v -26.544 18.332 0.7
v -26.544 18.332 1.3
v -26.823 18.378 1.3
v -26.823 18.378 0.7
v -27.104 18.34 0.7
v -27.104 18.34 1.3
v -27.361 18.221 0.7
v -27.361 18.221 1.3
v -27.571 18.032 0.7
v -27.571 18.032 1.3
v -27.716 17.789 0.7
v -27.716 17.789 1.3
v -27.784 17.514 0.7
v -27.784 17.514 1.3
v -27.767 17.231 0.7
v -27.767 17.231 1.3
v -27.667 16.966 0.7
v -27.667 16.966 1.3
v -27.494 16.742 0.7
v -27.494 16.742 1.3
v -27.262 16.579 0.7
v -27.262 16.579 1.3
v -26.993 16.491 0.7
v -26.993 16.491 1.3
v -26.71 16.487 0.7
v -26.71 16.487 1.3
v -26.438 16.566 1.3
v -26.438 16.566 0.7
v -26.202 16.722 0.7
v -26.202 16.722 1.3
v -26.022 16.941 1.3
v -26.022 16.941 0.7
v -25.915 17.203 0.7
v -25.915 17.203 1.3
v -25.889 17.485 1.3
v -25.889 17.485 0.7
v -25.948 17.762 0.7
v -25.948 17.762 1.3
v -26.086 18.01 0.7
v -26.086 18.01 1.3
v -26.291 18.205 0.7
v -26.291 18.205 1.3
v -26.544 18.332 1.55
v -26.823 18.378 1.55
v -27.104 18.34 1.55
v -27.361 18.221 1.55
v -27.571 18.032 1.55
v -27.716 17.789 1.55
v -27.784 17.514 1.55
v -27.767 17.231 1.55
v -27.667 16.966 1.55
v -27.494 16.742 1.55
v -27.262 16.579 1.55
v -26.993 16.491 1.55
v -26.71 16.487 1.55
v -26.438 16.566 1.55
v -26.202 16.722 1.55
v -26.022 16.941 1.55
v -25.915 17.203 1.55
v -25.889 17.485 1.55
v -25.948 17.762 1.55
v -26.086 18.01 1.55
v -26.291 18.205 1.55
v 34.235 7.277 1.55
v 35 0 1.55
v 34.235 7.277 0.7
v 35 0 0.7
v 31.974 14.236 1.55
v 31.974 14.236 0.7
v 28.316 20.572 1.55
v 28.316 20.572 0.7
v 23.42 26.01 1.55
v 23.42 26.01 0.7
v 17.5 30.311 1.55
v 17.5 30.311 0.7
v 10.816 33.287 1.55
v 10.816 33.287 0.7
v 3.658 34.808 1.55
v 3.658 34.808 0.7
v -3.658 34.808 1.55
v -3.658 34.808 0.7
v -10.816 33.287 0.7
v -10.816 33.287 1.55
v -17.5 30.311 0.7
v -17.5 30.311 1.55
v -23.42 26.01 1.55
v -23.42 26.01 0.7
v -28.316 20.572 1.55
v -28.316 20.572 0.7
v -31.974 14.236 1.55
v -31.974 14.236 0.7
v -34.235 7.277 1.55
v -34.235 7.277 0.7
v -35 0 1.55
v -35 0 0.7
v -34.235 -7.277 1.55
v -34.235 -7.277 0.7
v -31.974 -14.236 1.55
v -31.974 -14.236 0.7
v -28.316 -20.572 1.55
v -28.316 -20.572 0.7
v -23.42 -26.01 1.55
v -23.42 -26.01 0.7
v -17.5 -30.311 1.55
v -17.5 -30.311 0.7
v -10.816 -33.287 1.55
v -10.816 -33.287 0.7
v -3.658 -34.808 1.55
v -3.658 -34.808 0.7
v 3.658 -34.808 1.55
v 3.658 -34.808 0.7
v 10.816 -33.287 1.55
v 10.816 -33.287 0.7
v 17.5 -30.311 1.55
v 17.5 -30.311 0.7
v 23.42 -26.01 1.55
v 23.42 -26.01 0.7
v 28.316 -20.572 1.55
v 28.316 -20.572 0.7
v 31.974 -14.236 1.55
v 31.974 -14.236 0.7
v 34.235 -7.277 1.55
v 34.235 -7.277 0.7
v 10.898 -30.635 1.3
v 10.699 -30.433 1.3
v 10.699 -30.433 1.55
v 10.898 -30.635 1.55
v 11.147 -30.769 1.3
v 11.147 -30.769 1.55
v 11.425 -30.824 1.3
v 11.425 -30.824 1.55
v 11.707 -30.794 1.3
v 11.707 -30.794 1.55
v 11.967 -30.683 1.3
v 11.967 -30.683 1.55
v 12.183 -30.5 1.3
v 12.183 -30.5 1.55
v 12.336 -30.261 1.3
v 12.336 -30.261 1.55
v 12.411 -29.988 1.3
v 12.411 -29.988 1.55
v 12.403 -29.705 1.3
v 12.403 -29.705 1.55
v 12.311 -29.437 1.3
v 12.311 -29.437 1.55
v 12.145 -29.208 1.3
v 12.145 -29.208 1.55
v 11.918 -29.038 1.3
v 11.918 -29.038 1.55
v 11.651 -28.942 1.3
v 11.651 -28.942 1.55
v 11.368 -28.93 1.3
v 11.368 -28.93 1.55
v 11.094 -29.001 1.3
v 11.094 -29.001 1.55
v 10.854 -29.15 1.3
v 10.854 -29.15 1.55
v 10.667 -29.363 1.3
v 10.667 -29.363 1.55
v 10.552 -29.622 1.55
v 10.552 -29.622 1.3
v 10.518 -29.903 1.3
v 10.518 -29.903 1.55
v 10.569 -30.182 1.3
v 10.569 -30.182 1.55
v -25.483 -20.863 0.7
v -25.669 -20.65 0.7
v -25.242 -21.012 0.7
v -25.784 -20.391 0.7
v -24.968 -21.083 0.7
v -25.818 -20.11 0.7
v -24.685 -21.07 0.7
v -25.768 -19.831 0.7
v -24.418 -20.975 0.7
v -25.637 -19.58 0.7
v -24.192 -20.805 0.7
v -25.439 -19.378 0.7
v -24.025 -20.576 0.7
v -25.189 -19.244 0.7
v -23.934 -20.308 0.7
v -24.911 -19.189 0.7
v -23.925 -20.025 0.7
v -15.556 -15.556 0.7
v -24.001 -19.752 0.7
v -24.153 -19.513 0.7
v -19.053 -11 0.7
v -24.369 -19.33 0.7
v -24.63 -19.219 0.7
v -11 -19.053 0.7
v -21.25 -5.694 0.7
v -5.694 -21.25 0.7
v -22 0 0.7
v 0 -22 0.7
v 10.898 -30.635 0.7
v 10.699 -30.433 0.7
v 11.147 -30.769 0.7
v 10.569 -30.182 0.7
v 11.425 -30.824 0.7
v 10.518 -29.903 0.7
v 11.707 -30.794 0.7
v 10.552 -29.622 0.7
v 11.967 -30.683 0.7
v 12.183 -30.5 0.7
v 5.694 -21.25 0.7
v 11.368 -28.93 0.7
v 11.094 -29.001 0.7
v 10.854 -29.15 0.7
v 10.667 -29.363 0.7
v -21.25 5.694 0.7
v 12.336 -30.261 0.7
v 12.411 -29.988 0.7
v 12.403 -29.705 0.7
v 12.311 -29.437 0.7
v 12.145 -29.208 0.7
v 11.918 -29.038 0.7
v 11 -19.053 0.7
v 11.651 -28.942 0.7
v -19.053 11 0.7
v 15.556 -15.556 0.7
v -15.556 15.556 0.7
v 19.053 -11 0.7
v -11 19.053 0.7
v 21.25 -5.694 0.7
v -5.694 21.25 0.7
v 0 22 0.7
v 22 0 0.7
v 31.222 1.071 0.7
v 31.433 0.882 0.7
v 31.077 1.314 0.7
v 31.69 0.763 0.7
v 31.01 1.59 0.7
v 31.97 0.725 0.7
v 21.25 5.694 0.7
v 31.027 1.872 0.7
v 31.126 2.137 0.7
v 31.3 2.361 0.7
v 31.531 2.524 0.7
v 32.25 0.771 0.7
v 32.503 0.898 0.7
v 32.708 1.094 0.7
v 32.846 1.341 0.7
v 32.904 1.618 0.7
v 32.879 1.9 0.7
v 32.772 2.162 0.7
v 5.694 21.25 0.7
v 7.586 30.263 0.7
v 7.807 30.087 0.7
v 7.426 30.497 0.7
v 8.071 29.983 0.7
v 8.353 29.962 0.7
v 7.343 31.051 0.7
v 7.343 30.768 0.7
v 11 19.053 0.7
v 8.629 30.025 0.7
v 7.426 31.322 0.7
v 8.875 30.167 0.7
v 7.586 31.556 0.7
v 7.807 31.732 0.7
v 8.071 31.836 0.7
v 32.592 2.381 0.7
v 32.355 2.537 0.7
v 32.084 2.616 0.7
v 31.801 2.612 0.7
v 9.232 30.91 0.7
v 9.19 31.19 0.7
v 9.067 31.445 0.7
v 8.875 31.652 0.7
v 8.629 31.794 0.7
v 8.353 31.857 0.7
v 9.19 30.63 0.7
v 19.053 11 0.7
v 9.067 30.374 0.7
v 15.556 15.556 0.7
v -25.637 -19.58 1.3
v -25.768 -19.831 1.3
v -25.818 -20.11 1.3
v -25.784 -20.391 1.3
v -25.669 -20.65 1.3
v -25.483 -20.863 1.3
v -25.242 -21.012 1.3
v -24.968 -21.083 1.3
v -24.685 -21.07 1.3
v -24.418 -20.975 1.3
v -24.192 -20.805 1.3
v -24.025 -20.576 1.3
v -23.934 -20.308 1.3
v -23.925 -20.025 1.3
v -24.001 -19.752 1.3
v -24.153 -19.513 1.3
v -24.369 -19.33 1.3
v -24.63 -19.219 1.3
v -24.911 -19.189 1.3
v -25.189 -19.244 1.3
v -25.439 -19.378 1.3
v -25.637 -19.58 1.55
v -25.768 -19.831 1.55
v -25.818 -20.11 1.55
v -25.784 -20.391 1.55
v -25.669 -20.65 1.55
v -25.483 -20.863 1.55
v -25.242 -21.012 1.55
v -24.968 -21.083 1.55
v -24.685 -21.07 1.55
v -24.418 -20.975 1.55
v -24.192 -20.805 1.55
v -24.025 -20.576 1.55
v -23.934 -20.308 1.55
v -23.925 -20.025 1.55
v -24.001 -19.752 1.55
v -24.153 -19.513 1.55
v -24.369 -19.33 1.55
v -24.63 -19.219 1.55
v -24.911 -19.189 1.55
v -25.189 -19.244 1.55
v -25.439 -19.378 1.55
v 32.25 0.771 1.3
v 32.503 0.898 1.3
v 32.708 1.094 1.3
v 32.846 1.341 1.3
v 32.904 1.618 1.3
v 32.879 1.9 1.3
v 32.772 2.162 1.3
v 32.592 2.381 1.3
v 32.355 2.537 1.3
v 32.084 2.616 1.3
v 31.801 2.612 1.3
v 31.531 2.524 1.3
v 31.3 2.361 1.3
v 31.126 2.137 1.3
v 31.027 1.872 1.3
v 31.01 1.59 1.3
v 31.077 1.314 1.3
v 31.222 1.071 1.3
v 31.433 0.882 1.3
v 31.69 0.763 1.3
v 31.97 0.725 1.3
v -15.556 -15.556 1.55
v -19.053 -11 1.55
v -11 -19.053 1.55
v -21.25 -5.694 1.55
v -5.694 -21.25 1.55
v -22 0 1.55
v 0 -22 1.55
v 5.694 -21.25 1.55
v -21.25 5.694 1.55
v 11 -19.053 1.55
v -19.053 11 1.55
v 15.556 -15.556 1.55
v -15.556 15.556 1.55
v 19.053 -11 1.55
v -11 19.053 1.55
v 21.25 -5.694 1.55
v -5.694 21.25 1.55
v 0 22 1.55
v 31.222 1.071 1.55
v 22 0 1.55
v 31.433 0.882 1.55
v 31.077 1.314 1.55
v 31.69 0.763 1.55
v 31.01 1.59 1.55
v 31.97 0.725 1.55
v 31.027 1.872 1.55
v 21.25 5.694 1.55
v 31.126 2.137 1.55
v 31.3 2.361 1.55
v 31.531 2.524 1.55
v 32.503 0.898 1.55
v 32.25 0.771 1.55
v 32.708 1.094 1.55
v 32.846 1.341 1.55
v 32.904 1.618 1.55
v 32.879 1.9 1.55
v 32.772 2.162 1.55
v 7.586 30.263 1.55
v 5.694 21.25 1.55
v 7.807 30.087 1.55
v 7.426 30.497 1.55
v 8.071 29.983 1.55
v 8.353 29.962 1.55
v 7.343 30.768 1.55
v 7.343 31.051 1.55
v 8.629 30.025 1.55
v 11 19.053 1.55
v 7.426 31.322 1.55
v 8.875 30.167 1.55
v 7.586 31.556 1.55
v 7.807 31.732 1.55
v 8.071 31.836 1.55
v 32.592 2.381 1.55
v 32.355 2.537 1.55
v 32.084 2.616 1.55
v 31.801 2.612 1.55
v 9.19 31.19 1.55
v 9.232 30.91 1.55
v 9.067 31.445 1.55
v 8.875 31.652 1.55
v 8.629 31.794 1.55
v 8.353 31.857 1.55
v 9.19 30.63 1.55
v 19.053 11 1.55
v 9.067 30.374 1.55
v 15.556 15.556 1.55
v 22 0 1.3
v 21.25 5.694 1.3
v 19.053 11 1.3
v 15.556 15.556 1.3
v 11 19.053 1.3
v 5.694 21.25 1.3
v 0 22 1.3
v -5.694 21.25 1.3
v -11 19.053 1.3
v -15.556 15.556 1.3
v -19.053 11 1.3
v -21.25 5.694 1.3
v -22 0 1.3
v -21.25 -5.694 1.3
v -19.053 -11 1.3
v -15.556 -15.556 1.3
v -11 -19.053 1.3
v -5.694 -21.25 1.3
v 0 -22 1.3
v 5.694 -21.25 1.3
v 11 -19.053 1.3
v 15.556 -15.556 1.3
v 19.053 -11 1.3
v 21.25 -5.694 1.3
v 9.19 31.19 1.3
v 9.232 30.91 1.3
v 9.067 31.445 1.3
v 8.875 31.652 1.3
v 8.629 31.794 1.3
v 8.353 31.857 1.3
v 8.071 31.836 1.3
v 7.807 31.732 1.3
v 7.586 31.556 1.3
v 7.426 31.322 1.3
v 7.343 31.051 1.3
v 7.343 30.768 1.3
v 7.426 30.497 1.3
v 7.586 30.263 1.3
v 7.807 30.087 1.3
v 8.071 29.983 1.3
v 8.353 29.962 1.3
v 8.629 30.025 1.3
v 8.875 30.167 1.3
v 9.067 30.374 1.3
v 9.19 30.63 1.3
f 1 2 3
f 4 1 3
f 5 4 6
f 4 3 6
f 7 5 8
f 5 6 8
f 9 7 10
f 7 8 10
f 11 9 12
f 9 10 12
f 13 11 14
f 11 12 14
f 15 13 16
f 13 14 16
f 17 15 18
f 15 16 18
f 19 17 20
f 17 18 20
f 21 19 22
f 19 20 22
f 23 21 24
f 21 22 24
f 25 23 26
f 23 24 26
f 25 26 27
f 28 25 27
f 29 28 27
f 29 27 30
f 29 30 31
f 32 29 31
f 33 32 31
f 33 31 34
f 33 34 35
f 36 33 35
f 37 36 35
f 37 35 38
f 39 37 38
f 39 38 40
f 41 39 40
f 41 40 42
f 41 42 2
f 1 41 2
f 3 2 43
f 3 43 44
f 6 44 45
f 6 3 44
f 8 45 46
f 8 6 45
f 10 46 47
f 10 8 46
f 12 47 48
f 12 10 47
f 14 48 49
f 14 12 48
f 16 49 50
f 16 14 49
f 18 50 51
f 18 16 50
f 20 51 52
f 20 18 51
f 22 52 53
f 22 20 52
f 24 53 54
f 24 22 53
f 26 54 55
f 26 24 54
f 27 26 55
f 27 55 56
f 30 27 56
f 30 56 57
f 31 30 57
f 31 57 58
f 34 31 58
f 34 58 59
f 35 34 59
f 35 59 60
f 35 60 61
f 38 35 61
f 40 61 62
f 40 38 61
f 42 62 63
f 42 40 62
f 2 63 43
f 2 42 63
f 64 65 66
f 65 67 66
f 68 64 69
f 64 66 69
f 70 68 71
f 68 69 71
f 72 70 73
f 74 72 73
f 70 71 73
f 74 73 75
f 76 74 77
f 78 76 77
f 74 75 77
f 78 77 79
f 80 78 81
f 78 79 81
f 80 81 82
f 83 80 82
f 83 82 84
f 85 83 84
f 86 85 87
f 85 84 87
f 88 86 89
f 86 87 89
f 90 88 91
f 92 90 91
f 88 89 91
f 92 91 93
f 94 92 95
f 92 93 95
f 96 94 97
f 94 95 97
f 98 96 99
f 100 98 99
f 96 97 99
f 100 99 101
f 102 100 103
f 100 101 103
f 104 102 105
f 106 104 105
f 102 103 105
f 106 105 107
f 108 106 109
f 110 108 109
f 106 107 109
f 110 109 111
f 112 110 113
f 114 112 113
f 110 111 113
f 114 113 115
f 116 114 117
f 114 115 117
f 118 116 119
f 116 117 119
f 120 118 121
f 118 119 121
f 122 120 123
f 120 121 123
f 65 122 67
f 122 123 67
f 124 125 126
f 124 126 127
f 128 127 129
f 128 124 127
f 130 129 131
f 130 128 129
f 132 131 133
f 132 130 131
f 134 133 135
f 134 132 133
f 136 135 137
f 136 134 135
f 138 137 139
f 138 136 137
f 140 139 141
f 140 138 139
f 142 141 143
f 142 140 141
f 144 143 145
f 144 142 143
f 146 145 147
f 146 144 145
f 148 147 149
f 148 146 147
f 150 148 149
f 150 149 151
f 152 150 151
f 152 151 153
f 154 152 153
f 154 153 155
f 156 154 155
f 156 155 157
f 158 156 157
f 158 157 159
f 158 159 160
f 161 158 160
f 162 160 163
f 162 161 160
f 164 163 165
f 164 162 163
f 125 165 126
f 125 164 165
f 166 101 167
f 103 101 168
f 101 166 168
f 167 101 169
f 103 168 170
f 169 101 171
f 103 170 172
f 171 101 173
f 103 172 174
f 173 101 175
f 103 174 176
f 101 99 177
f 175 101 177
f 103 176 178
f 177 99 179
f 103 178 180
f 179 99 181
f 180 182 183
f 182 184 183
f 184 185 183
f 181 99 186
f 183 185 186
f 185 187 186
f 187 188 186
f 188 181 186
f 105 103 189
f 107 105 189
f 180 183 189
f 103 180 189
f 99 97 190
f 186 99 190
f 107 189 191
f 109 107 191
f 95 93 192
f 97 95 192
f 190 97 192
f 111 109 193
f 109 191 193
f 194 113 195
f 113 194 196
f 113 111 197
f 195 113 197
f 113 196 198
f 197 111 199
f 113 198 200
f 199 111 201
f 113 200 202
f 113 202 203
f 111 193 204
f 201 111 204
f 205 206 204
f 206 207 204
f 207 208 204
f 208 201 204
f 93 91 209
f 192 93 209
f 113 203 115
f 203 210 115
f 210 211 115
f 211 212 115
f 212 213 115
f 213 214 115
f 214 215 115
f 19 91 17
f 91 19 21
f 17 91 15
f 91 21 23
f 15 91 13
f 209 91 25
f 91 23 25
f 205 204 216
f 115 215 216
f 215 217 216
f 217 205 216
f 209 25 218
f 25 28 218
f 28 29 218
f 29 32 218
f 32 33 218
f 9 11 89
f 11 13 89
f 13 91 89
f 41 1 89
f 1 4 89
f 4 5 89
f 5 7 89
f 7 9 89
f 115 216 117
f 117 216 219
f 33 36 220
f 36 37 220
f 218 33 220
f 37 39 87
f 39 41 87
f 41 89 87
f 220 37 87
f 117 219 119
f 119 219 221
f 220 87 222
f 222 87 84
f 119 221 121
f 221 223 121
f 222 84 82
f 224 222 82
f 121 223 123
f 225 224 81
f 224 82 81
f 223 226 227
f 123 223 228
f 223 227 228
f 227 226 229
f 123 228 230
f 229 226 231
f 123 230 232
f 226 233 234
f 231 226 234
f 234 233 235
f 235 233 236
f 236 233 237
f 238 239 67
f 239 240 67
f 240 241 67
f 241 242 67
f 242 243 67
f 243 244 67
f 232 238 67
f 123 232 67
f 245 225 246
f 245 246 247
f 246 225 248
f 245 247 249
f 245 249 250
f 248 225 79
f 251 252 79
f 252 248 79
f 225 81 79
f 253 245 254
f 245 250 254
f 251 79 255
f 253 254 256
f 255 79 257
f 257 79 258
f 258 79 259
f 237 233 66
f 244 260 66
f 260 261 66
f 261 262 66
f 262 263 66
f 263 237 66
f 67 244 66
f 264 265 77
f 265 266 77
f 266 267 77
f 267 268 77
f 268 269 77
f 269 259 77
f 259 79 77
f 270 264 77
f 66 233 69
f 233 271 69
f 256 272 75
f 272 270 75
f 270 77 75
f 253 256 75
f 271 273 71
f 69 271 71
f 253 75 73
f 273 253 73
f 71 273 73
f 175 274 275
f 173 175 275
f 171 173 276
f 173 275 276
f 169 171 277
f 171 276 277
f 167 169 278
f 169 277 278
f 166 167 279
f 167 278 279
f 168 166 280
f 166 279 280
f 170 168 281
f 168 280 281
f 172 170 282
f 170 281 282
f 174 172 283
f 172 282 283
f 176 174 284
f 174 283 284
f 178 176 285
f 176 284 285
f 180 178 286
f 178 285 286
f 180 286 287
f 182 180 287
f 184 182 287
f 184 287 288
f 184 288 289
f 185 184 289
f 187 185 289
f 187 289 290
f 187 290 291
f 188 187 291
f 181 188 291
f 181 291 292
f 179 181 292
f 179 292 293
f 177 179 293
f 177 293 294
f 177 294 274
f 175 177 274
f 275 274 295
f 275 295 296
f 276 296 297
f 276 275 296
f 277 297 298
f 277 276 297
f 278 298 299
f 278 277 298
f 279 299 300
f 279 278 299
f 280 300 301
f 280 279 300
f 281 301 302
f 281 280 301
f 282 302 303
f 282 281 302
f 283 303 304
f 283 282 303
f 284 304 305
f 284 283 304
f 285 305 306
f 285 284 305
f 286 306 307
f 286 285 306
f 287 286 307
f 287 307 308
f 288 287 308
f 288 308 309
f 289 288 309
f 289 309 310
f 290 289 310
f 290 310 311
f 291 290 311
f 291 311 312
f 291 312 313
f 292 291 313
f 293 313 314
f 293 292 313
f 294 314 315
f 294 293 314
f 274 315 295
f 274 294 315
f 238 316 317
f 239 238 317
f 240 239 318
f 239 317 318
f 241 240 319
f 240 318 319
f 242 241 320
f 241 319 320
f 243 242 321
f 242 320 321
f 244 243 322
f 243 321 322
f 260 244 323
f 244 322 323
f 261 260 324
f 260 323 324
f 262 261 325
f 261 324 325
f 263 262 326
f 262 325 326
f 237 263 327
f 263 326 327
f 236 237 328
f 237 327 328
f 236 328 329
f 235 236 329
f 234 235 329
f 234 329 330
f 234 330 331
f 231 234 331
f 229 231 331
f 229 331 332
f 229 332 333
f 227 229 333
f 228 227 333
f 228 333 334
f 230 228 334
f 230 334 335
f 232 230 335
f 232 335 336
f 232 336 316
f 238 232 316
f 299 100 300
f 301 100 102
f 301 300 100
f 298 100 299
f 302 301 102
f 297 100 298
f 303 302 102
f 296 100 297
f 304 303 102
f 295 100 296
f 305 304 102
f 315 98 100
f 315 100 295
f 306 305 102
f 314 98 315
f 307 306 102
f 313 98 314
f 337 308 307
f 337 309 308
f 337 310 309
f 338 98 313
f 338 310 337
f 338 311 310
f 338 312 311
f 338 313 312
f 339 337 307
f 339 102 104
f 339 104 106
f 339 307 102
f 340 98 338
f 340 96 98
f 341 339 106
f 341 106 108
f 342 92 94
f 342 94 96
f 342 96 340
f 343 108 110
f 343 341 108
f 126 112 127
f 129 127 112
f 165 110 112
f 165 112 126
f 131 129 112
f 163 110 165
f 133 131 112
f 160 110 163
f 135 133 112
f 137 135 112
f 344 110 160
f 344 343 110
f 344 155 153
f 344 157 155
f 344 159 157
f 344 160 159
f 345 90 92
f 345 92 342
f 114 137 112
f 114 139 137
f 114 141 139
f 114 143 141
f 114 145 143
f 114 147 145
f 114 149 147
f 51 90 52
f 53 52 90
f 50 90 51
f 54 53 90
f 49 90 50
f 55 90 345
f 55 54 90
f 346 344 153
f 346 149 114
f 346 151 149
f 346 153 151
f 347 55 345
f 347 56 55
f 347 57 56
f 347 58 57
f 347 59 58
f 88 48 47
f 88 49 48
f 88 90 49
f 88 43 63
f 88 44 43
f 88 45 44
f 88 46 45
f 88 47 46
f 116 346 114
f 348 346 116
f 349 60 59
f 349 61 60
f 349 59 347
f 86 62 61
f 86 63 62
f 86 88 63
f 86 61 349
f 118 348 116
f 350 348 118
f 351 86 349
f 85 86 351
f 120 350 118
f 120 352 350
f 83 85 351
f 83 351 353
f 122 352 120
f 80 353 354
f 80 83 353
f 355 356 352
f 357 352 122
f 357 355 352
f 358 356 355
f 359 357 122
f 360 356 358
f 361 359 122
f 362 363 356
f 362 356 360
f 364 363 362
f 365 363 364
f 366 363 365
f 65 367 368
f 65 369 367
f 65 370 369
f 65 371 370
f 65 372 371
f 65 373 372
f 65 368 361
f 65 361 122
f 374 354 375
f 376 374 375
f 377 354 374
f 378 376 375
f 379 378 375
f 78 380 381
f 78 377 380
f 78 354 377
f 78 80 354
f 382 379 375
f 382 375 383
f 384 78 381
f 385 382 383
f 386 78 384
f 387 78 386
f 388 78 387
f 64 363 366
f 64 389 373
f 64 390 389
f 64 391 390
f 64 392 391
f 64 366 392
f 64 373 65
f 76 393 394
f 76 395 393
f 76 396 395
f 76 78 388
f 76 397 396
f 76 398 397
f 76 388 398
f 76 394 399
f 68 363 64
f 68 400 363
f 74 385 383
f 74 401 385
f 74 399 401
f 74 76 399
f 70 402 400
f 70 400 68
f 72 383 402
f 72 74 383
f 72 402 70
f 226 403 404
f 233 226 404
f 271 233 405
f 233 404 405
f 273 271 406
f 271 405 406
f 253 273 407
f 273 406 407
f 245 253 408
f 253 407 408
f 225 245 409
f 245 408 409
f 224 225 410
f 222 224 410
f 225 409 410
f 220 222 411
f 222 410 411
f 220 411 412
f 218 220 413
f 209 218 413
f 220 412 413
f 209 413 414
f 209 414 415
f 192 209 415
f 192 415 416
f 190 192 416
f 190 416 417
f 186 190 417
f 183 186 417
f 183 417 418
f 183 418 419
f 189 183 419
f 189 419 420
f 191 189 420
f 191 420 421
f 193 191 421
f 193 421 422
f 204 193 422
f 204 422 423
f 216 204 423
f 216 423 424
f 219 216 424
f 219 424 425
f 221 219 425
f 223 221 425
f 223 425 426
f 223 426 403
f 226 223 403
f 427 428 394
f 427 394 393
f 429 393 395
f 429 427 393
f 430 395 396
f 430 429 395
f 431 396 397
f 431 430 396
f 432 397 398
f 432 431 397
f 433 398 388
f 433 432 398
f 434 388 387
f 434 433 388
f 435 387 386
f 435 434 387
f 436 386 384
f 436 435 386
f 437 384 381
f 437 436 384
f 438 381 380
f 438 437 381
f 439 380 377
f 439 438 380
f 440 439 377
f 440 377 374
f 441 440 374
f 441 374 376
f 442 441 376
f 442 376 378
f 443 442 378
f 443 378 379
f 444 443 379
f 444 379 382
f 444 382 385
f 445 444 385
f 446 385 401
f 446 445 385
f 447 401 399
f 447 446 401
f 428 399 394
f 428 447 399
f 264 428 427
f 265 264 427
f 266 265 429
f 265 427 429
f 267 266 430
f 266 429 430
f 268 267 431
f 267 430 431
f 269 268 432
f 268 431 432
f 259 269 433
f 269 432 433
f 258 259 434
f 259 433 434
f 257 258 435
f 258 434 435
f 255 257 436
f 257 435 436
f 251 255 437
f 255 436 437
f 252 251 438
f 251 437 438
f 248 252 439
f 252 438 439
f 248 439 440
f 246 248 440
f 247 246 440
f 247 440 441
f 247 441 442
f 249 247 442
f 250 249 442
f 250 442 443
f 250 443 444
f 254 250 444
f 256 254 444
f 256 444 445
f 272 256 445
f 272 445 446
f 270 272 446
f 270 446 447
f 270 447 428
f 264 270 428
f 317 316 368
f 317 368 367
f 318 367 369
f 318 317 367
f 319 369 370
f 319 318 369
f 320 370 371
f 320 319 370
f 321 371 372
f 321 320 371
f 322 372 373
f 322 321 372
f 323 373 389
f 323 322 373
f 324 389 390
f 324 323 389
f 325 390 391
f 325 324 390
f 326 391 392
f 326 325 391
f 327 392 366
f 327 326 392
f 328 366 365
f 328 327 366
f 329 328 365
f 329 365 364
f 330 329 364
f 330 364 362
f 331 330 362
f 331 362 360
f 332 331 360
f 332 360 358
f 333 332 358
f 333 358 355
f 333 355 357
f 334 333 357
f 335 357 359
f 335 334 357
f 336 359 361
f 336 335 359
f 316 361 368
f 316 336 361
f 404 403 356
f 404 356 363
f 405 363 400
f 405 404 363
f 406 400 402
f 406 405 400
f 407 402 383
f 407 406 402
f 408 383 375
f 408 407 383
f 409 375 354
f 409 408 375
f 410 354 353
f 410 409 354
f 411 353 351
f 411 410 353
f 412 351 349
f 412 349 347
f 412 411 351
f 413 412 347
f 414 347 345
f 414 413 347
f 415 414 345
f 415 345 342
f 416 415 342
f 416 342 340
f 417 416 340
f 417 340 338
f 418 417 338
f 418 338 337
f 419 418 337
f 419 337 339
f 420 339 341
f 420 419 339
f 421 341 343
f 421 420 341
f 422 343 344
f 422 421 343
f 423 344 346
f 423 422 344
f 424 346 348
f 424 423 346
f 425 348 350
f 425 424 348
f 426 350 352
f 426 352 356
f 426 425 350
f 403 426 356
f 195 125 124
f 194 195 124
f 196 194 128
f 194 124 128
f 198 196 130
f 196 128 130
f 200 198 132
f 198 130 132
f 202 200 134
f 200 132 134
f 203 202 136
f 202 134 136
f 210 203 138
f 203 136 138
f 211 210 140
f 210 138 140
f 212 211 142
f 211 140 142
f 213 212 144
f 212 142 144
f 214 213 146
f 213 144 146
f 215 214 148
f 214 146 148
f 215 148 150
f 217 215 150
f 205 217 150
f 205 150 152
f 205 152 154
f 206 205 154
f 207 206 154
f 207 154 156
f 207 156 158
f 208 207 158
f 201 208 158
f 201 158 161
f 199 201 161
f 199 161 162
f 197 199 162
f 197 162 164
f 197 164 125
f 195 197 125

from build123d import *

# Parameters (mm, degrees)
SKETCH1_R           = 35
BOSS_EXTRUDE1_DEPTH = 1.3
SKETCH2_R           = 22
CUT_EXTRUDE1_DEPTH  = 50.514543318
MOVE_FACE1_BY       = 0.7
SKETCH5_R           = 0.95
CUT_EXTRUDE4_DEPTH  = 50.501111099
CIRPATTERN2_COUNT   = 5
MOVE_FACE2_BY       = 0.25


with BuildPart() as part:
    # Sketch1 → Boss-Extrude1 (new body)
    with BuildSketch(Plane.XY):
        Circle(SKETCH1_R)
    extrude(amount=BOSS_EXTRUDE1_DEPTH)

    # Sketch2 → Cut-Extrude1 (cut, through all)
    with BuildSketch(Plane.XY.offset(1.3)):
        Circle(SKETCH2_R)
    extrude(amount=-CUT_EXTRUDE1_DEPTH, mode=Mode.SUBTRACT)

    # Move Face1: a face moved inward by 0.7
    extrude(part.faces().sort_by_distance((0, -28, 0))[0], amount=MOVE_FACE1_BY, dir=(0, 0, 1), mode=Mode.SUBTRACT)

    # Sketch5 → Cut-Extrude4 (cut, through all)
    with BuildSketch(Plane.XY.offset(1.3)):
        with Locations((8.282209443, 30.909626441)):
            Circle(SKETCH5_R)
    cut_extrude4 = extrude(amount=-CUT_EXTRUDE4_DEPTH, mode=Mode.SUBTRACT)

    # CirPattern2: Cut-Extrude4 ×5 about axis
    cirpattern2_axis = Axis((0, 0, -88.99), (0, 0, 1))
    for i in range(1, CIRPATTERN2_COUNT):
        add(cut_extrude4.rotate(cirpattern2_axis, i * 360 / CIRPATTERN2_COUNT), mode=Mode.SUBTRACT)

    # Move Face2: a face moved outward by 0.25
    extrude(part.faces().sort_by_distance((0, -28, 1.3))[0], amount=MOVE_FACE2_BY, dir=(0, 0, 1))


solid = part.part
